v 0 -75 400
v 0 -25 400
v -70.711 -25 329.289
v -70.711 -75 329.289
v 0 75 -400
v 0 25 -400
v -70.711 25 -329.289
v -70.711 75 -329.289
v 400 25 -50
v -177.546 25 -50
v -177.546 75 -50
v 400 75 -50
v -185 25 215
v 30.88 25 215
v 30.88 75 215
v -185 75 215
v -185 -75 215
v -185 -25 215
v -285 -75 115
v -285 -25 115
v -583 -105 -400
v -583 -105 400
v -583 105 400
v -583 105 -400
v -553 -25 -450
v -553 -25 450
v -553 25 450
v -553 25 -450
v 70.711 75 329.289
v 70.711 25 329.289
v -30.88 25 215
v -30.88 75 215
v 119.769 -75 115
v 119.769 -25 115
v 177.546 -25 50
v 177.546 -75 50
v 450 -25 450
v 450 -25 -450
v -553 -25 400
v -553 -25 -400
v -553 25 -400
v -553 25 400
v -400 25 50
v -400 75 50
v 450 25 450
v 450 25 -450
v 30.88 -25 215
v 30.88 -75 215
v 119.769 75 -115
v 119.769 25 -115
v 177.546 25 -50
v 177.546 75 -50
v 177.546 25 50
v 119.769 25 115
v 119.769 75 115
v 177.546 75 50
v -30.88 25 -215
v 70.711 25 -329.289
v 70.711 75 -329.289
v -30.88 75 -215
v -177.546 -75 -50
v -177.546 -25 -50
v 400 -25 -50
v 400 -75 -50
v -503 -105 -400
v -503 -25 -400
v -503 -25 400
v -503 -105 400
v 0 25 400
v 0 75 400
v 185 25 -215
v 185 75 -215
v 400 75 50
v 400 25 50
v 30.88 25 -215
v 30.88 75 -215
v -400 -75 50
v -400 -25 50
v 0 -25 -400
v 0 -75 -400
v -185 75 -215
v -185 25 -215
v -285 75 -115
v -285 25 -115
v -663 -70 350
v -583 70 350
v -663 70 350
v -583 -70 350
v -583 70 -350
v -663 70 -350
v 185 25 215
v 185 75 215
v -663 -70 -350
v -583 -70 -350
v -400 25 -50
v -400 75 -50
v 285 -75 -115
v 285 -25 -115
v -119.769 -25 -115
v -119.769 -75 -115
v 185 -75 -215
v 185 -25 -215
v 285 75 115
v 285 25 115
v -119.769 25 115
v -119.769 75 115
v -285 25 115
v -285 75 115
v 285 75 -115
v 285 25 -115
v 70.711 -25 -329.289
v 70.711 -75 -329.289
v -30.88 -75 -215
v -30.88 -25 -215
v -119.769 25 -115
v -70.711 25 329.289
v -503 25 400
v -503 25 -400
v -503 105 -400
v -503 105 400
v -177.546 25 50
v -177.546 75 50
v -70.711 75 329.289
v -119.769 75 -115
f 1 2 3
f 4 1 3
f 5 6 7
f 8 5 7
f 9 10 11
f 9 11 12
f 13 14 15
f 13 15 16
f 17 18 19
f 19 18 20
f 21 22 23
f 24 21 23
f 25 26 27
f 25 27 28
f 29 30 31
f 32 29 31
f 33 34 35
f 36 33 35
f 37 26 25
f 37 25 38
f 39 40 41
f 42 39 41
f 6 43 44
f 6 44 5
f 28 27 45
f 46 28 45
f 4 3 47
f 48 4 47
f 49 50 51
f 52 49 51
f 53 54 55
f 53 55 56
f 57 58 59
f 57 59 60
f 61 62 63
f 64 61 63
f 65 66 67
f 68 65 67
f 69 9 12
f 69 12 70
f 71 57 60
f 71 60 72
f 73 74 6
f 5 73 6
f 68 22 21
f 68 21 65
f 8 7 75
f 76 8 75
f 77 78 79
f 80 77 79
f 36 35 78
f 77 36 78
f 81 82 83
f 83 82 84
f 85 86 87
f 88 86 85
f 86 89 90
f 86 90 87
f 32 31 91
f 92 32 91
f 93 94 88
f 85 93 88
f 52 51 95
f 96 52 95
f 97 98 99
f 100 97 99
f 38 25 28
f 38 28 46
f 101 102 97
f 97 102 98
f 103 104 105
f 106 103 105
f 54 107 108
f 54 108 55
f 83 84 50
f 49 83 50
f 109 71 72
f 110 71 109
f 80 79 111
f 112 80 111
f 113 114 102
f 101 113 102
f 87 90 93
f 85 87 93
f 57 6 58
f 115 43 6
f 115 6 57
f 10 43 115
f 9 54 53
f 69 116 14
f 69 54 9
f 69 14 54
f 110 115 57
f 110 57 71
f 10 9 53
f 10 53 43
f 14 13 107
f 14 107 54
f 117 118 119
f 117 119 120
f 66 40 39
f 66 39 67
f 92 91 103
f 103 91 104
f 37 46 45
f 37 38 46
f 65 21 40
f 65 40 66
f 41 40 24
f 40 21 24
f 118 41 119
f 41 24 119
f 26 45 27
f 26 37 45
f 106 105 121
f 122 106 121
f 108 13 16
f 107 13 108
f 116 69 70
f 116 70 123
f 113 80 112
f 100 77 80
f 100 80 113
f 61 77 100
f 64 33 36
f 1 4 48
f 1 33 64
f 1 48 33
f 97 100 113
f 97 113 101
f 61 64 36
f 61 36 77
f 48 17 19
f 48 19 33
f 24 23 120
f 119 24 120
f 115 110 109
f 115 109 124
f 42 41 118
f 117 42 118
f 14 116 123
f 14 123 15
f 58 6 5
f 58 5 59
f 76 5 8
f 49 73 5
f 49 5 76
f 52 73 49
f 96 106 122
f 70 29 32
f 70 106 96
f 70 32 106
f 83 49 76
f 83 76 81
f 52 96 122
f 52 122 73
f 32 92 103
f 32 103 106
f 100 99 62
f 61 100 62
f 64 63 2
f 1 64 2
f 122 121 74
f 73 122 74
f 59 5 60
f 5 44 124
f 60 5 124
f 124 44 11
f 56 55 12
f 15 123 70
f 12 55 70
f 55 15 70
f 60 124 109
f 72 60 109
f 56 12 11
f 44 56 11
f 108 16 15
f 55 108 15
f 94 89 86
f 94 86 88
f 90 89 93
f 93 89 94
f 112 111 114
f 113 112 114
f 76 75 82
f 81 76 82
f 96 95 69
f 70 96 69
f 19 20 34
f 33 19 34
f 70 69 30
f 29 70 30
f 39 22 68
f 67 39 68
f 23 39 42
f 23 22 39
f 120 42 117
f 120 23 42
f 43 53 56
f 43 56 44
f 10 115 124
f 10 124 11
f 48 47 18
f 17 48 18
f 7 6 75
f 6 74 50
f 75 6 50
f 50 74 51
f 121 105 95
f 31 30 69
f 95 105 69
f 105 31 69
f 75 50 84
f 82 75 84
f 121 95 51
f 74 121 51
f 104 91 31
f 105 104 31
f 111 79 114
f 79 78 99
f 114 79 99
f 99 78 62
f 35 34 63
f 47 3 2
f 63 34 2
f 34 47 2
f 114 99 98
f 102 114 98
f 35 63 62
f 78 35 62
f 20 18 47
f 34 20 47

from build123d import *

# Parameters (mm, degrees)
F1_DEPTH  = 25
F2_W      = 80
F2_H      = 800
F3_DEPTH  = 80
F5_W      = 30
F5_H      = 50
F6_DEPTH  = 800
F8_DEPTH  = 50
F11_W     = 140
F11_H     = 700
F12_DEPTH = 80


with BuildPart() as f1:
    # F0 (on Front) → F1 (new body, symmetric)
    with BuildSketch(Plane.XZ):
        Polygon((450, 450), (-450, 450), (-553, 450), (-553, -450), (-450, -450), (450, -450), align=None)
    extrude(amount=F1_DEPTH, both=True)


with BuildPart() as f3:
    # F2 (on face) → F3 (new body)
    with BuildSketch(Plane.XZ.offset(25)):
        with Locations((-543, 0)):
            Rectangle(F2_W, F2_H)
    extrude(amount=F3_DEPTH)


with BuildPart() as f4_1:
    # F4: instance of F3
    add(f3.part.mirror(Plane.XZ))


with BuildPart() as f3_1:
    add(f3.part)

    add(f4_1.part)  # F6 merges F4_1
    # F5 (on face) → F6 (join, through all)
    with BuildSketch(Plane.XY.offset(400)):
        with Locations((-568, 0)):
            Rectangle(F5_W, F5_H)
    extrude(amount=-F6_DEPTH)


with BuildPart() as f8:
    # F7 (on face) → F8 (new body)
    with BuildSketch(Plane.XZ.offset(25)):
        Polygon((-400, 50), (0, -400), (70.7106781187, -329.2893218813), (-30.8798302203, -215), (185, -215), (285, -115), (-119.7687191092, -115), (-177.546496887, -50), (400, -50), (0, 400), (-70.7106781187, 329.2893218813), (30.8798302203, 215), (-185, 215), (-285, 115), (119.7687191092, 115), (177.546496887, 50), align=None)
    extrude(amount=F8_DEPTH)


with BuildPart() as f9_1:
    # F9: instance of F8
    add(f8.part.mirror(Plane.XZ))


with BuildPart() as f10_1:
    # F10: instance of F9_1
    add(f9_1.part.mirror(Plane.YZ))


with BuildPart() as f12:
    # F11 (on face) → F12 (new body)
    with BuildSketch(Plane(origin=(-583, 0, 0), x_dir=(0, -1, 0), z_dir=(-1, 0, 0))):
        Rectangle(F11_W, F11_H)
    extrude(amount=F12_DEPTH)


solid = Compound([f1.part, f3_1.part, f8.part, f9_1.part, f10_1.part, f12.part])
